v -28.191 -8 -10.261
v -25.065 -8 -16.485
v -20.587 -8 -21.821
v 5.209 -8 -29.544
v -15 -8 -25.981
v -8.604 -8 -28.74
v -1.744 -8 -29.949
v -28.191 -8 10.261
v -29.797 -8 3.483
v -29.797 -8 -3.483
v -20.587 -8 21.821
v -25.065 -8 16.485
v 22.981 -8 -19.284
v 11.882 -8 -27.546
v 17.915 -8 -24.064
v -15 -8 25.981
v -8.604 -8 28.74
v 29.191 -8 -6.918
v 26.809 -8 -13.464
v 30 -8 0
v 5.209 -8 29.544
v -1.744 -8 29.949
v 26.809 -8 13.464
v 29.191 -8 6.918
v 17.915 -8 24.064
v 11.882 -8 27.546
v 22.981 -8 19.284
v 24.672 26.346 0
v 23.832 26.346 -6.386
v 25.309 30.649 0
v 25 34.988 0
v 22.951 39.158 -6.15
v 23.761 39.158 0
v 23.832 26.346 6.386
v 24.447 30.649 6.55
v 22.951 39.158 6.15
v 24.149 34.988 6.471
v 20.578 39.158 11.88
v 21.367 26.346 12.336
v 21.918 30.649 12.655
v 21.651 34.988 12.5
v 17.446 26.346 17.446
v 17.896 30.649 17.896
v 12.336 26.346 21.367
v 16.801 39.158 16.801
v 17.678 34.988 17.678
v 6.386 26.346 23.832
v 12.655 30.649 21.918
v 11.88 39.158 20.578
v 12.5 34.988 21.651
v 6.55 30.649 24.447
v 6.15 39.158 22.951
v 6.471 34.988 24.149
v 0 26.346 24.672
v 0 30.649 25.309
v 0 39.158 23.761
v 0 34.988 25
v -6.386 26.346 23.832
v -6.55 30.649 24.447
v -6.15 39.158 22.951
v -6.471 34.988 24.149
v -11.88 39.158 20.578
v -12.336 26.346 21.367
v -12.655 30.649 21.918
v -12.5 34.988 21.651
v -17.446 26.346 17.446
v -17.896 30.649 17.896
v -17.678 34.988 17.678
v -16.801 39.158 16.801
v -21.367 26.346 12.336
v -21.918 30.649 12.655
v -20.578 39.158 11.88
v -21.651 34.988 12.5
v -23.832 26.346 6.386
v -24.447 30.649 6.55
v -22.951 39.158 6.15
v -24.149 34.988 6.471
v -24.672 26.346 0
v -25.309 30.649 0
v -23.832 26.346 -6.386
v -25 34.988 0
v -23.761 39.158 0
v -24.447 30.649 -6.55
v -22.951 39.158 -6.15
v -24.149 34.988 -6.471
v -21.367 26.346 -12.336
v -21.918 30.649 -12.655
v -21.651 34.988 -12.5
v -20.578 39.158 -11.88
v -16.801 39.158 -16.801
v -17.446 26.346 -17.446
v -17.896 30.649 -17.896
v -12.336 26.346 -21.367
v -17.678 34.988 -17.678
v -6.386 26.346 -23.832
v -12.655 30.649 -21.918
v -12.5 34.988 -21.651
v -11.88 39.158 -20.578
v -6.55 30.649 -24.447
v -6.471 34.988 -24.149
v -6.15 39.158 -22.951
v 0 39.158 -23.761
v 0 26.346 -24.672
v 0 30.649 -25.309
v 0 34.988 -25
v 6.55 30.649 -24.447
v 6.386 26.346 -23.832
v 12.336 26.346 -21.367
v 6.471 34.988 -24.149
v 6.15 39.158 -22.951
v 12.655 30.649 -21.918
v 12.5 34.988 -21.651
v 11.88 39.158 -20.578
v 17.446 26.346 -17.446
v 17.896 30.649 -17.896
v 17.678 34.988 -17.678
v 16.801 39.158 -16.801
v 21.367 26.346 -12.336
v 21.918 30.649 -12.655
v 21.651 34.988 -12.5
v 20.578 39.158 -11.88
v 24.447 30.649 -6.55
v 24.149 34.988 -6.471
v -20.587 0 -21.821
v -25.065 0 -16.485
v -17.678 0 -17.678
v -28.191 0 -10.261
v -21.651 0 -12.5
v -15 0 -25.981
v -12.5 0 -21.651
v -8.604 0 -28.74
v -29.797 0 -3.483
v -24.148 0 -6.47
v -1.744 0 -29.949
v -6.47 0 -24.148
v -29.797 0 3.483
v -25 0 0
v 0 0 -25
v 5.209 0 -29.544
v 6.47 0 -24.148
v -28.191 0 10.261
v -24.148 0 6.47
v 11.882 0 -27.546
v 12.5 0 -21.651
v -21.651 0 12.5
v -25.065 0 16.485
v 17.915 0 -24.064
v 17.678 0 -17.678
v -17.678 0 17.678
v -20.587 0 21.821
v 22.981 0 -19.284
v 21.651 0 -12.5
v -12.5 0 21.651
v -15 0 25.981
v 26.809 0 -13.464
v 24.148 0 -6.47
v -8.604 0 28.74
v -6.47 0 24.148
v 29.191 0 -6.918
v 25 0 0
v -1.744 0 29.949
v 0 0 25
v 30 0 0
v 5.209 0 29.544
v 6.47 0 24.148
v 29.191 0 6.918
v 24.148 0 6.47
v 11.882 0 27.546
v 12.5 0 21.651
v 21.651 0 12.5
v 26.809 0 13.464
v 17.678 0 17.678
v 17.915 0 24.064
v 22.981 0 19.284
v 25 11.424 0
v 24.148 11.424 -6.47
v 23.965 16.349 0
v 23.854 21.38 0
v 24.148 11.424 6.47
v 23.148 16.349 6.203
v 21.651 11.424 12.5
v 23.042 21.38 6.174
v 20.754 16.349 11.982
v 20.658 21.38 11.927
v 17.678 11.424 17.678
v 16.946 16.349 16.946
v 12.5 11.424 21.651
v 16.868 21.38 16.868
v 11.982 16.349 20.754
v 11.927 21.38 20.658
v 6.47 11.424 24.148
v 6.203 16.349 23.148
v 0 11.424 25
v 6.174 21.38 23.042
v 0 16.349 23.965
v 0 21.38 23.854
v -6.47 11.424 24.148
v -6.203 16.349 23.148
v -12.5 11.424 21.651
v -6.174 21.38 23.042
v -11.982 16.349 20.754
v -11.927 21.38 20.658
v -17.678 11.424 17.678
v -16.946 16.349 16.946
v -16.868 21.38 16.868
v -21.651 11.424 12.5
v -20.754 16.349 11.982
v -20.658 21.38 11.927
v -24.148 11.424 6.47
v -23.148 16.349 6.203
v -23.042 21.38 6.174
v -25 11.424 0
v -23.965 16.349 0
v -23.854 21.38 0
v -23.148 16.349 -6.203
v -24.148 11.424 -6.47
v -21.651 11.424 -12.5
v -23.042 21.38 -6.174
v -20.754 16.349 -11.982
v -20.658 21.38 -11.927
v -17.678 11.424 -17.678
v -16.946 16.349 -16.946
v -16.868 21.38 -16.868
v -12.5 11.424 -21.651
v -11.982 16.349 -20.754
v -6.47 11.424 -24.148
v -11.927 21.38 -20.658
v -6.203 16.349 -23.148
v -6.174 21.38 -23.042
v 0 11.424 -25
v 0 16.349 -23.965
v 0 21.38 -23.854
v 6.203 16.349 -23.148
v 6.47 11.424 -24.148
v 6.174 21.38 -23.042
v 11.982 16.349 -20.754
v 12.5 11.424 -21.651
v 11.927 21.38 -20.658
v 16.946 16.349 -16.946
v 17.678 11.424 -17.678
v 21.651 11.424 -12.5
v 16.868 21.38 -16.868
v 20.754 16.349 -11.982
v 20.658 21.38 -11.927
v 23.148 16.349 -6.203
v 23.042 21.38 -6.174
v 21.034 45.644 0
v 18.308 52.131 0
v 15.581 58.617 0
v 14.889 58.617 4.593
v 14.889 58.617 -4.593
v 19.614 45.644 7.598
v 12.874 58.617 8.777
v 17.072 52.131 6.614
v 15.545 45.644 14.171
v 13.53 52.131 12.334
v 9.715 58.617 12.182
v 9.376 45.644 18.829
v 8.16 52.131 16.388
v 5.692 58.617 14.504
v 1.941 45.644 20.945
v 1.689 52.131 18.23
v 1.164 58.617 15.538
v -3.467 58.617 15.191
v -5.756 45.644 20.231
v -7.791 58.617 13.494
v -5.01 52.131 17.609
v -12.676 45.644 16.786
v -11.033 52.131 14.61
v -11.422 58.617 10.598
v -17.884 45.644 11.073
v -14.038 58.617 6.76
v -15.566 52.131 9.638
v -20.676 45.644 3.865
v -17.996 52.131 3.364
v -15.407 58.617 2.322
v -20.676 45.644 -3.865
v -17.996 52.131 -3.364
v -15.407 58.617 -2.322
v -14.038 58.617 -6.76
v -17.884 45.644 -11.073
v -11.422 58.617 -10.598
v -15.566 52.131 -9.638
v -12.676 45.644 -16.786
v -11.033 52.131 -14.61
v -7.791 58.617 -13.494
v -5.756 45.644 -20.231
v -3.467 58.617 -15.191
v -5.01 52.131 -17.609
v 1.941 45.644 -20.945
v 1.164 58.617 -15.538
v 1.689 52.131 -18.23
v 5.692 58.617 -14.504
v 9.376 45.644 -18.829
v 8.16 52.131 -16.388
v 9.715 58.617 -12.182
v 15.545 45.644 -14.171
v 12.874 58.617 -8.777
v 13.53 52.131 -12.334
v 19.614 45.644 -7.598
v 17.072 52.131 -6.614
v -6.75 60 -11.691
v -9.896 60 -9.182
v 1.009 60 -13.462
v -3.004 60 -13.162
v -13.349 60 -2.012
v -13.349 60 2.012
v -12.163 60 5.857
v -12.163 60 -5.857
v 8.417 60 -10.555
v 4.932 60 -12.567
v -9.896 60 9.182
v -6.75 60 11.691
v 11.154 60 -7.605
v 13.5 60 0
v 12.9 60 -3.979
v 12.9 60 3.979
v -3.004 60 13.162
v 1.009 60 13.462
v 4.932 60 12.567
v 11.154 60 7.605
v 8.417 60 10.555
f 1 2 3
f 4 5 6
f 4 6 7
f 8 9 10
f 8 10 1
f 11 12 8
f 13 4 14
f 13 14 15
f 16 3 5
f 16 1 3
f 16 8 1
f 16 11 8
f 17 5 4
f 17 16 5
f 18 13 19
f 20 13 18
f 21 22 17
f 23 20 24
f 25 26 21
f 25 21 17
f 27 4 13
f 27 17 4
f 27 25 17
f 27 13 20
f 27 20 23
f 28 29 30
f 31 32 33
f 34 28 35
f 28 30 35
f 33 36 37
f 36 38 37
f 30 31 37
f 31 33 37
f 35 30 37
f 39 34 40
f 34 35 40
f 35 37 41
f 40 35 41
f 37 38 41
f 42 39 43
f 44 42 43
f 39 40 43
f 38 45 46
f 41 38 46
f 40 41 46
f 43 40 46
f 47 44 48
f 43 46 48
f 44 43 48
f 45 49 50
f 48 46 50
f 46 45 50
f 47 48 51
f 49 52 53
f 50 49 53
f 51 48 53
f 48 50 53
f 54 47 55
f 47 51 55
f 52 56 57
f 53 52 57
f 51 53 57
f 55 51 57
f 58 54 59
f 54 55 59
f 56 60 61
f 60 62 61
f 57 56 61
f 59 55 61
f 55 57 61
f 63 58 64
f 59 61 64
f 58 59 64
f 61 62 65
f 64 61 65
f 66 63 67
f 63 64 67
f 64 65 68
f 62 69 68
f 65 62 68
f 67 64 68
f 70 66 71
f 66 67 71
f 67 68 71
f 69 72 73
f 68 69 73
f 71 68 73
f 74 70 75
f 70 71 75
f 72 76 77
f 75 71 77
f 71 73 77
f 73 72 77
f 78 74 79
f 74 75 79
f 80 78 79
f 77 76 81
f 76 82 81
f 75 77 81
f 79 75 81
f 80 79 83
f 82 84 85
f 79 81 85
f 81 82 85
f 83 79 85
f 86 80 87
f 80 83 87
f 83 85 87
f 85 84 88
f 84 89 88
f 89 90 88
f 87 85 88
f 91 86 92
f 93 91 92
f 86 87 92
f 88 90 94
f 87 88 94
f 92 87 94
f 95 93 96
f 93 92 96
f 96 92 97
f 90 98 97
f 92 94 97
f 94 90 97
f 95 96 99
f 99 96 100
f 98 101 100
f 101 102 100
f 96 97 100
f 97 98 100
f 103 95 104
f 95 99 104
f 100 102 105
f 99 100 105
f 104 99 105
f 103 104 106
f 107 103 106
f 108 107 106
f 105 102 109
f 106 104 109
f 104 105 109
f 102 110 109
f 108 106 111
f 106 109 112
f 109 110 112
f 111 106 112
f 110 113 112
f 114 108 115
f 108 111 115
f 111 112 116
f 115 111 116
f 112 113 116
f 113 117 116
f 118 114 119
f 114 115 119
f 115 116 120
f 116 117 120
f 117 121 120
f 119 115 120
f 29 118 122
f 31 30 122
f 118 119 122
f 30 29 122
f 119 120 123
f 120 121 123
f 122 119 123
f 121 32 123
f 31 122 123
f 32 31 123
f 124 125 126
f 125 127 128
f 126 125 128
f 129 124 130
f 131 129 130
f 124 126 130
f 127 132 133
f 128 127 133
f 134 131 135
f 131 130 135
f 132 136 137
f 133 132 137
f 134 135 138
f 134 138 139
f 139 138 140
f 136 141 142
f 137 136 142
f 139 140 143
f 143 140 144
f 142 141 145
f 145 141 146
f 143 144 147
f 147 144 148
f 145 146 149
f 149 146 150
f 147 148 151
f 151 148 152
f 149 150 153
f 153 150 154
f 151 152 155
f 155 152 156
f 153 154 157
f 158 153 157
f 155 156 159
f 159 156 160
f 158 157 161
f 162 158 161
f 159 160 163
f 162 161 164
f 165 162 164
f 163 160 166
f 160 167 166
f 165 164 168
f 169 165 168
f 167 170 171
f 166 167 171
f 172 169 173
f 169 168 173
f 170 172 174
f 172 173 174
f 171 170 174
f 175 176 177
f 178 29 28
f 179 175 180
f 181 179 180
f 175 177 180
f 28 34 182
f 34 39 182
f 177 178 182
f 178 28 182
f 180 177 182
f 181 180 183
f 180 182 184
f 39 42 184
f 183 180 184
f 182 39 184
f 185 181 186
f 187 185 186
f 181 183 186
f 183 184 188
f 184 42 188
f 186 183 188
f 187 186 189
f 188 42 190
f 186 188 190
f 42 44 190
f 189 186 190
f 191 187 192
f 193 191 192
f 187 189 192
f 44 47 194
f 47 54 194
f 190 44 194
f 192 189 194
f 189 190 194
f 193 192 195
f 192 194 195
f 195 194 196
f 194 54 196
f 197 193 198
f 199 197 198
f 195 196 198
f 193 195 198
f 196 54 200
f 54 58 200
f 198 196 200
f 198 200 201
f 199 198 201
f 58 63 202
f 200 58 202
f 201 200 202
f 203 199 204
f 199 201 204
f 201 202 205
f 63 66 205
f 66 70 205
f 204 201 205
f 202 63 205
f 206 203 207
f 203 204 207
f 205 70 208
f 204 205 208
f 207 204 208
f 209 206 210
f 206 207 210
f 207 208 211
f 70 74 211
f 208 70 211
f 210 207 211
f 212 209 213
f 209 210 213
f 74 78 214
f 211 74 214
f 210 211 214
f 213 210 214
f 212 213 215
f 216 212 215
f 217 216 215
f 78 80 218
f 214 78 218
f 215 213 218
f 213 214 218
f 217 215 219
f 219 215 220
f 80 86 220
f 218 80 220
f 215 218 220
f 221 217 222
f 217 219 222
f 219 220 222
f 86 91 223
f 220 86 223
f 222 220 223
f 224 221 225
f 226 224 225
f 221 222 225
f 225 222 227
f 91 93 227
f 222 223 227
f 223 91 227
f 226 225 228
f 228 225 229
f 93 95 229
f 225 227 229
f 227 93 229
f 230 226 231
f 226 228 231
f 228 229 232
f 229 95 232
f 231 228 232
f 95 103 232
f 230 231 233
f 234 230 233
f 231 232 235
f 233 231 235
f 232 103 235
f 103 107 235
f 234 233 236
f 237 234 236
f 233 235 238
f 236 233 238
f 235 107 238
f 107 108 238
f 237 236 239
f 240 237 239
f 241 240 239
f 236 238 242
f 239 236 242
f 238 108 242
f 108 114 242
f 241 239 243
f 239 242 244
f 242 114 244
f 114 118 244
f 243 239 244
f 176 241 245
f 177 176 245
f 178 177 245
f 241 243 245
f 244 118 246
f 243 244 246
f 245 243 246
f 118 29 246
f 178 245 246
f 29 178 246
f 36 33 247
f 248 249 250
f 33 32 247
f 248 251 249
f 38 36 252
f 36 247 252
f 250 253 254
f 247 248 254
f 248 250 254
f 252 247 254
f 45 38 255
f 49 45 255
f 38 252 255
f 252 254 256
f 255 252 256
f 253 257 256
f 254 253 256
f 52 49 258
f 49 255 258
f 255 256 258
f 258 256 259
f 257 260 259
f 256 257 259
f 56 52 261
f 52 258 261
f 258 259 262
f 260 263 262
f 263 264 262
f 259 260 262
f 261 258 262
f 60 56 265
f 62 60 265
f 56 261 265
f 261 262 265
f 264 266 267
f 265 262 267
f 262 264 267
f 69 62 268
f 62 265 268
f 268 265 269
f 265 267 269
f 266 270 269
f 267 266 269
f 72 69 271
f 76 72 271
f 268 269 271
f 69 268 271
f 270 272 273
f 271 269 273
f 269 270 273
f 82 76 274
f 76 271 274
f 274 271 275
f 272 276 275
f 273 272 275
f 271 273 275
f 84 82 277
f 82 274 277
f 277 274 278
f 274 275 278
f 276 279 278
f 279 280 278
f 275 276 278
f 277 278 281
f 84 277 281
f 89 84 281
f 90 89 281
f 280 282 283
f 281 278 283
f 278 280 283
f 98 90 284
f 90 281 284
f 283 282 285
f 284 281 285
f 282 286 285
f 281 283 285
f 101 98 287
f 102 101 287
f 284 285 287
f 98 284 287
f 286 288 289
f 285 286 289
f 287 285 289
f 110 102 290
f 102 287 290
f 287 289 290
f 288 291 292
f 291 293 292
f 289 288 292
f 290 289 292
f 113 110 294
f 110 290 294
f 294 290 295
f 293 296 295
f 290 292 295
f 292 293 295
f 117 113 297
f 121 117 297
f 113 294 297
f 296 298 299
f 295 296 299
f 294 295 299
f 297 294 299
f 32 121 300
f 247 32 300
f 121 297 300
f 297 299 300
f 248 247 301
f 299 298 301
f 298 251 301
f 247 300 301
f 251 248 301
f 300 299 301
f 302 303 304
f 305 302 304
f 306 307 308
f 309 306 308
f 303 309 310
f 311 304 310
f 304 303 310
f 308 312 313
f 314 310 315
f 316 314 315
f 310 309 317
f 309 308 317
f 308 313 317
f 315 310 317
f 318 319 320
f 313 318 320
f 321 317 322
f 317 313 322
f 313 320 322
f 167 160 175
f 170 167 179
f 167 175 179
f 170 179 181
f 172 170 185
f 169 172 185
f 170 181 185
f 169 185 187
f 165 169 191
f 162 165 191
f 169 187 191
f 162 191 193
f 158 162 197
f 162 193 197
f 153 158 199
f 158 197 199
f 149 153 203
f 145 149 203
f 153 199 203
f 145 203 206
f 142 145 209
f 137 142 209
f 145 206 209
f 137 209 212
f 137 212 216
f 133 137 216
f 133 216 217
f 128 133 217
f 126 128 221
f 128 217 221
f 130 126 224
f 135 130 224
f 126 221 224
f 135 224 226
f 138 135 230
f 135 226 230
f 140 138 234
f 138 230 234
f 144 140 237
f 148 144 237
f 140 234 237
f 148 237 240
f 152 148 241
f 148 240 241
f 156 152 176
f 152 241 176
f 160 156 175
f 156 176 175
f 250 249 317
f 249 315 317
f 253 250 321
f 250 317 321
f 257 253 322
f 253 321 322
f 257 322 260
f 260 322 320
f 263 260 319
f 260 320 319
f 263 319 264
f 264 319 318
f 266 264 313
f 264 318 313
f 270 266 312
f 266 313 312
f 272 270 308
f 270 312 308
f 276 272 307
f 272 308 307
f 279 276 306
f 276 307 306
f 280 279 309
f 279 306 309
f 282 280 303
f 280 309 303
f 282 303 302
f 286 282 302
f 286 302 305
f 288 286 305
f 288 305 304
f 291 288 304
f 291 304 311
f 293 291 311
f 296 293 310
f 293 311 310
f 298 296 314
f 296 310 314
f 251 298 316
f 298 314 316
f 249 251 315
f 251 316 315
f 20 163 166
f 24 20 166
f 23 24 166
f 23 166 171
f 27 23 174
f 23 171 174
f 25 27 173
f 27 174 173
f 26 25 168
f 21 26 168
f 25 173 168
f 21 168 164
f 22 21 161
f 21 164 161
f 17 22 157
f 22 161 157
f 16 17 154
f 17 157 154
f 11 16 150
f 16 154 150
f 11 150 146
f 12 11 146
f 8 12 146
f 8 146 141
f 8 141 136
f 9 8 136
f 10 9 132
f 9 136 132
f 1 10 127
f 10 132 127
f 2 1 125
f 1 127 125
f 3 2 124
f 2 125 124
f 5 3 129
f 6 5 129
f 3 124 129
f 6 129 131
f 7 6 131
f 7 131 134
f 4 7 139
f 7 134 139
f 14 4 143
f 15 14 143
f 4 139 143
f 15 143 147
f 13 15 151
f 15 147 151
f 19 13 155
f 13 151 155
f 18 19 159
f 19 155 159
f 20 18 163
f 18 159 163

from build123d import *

# Parameters (mm, degrees)
SKETCH2_R           = 30
BOSS_EXTRUDE1_DEPTH = 8


with BuildPart() as part:
    # Sketch1 → Revolve1 (revolve)
    with BuildSketch(Plane.XY):
        with BuildLine():
            Line((0, 0), (25, 0))
            Line((25, 0), (25, 11.42377433))
            ThreePointArc((25, 11.42377433), (23.792992012, 18.861807529), (24.672326333, 26.345655289))
            ThreePointArc((24.672326333, 26.345655289), (25.273083835, 32.826746989), (23.760908087, 39.157527645))
            Line((23.760908087, 39.157527645), (15.581247413, 58.617194357))
            Line((15.581247413, 58.617194357), (13.5, 60))
            Line((13.5, 60), (0, 60))
            Line((0, 60), (0, 0))
        make_face()
    revolve(axis=Axis((0, 0, 0), (0, -1, 0)))

    # Sketch2 → Boss-Extrude1 (add)
    with BuildSketch(Plane.XZ):
        Circle(SKETCH2_R)
    extrude(amount=BOSS_EXTRUDE1_DEPTH)


solid = part.part
